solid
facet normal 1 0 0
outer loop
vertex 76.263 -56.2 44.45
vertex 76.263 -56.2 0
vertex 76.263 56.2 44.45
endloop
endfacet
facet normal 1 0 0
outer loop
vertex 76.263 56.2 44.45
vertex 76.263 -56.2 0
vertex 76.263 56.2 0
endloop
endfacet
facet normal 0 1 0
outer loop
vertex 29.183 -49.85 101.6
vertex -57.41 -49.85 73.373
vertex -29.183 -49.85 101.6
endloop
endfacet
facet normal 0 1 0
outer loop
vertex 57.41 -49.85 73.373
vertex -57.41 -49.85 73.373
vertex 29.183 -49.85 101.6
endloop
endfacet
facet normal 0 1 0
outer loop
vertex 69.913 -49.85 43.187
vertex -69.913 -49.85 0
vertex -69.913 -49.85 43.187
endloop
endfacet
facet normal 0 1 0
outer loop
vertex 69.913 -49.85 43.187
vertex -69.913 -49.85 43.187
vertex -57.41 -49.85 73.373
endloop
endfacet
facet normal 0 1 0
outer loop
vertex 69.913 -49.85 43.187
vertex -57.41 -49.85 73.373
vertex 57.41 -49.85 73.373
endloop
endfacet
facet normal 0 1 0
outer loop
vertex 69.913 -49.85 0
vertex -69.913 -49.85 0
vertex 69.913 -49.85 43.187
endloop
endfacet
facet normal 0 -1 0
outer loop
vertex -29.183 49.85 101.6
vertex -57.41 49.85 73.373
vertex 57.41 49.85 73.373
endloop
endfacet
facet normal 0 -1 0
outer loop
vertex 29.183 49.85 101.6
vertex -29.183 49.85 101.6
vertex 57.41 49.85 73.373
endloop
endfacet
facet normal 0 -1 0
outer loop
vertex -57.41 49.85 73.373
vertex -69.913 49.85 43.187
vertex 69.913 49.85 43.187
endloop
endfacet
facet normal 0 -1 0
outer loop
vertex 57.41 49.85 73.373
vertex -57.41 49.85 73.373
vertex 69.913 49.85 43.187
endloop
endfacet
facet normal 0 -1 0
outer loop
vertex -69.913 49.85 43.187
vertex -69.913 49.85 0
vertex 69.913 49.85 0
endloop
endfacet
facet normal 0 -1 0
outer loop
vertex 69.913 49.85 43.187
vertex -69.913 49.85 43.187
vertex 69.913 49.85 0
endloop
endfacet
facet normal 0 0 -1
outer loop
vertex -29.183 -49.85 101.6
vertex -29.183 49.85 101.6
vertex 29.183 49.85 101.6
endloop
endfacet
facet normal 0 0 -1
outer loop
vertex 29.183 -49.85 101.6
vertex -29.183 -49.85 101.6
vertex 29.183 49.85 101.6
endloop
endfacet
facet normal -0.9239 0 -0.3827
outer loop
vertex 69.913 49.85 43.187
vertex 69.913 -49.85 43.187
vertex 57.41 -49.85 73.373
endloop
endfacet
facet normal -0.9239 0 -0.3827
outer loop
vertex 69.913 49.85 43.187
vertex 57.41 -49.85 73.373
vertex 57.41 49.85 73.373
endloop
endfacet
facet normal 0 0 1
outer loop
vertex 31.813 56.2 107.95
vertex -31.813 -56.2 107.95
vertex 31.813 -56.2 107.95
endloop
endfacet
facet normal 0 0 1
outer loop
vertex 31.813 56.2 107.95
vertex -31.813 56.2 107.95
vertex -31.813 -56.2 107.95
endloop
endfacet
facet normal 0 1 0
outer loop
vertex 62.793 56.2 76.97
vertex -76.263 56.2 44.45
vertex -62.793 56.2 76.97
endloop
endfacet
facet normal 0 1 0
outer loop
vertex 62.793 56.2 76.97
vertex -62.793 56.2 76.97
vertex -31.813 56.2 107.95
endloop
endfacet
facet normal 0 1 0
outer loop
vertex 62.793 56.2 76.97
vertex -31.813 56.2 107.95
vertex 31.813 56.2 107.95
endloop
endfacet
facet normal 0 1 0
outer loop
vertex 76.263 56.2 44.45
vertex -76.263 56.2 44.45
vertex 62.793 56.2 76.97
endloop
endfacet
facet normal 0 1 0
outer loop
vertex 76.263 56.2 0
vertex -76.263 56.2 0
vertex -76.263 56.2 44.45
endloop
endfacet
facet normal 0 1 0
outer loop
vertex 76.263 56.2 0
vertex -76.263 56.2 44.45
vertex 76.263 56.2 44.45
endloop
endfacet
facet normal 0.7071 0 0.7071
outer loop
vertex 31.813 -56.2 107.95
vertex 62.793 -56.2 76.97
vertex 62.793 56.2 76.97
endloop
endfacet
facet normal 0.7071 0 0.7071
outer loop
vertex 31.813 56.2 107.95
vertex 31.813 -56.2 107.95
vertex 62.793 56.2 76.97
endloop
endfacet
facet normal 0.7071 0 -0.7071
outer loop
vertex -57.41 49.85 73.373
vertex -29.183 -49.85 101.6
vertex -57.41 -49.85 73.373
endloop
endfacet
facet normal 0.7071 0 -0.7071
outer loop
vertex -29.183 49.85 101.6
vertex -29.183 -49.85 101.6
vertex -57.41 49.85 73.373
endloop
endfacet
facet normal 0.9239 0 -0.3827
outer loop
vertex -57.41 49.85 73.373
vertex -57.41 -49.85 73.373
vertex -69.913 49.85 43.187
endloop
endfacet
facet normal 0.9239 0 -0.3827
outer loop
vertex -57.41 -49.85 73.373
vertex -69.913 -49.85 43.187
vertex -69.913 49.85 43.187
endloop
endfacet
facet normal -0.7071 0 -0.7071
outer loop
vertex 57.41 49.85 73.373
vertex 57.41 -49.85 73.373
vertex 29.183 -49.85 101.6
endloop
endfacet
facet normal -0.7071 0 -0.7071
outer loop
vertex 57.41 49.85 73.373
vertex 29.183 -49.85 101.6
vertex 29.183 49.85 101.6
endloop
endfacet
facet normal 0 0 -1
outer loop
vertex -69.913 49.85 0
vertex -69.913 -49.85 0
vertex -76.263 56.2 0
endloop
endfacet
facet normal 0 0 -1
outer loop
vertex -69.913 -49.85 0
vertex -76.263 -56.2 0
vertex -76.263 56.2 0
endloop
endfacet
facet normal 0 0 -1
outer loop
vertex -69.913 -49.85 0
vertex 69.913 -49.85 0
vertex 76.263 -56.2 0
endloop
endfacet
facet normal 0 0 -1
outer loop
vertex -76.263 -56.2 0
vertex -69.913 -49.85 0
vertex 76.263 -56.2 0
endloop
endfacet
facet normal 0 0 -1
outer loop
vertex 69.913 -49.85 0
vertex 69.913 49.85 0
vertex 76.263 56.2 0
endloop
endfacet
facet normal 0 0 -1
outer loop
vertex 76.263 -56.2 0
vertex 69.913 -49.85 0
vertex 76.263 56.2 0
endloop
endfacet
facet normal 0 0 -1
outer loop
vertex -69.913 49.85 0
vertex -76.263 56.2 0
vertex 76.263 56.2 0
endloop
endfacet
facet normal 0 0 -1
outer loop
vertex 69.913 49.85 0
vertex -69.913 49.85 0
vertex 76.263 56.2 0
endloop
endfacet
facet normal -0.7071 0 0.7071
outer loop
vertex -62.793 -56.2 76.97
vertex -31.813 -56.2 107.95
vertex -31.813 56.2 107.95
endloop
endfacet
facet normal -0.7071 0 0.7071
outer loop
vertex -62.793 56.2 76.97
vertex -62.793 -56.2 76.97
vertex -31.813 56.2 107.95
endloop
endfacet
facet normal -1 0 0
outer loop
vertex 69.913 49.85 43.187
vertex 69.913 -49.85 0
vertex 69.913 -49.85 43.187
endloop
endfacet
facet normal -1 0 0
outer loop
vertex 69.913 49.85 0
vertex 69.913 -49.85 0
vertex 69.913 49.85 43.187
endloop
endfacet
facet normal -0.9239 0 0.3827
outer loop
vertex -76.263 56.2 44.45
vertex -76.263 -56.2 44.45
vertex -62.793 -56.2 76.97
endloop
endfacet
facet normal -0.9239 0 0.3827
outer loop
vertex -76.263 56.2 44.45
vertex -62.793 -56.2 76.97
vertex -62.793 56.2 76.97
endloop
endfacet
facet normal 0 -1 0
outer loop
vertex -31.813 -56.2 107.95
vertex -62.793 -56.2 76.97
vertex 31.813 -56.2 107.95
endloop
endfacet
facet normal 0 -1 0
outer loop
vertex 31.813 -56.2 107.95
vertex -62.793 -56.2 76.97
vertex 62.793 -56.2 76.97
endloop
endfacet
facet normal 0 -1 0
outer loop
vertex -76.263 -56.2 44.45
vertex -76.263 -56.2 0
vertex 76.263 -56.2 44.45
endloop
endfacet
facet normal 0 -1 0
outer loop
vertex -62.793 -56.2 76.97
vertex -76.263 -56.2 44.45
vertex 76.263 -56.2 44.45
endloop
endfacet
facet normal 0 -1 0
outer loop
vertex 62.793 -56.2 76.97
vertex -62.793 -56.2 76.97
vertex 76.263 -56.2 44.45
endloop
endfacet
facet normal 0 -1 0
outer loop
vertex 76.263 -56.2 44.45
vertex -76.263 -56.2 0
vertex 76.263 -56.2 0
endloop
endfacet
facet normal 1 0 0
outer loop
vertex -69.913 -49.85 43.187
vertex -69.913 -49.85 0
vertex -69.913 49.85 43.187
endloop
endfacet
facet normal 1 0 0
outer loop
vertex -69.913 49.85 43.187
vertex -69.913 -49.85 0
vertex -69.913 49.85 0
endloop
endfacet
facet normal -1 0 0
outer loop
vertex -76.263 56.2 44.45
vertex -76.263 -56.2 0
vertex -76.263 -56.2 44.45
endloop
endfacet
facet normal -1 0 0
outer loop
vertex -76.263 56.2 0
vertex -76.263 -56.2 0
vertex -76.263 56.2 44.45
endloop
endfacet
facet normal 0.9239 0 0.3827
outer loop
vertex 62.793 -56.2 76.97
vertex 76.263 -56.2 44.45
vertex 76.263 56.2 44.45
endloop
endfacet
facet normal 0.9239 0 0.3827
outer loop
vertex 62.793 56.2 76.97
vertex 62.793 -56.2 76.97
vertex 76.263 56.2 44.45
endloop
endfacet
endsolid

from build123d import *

# Parameters (mm, degrees)
F0_W     = 152.5266170502
F0_H     = 112.4007552862
F1_DEPTH = 107.95
F2_SIZE  = 44.45
F3_SIZE  = 44.45
F4_SIZE  = 19.05
F5_SIZE  = 19.05
F6_T     = -6.35


with BuildPart() as f1:
    # F0 (on Top) → F1 (new body)
    with BuildSketch(Plane.XY):
        Rectangle(F0_W, F0_H)
    extrude(amount=F1_DEPTH)

    # F2
    f2_edges = [f1.edges().sort_by_distance(p)[0] for p in [
        (-76.263309, 0, 107.95),
    ]]
    chamfer(f2_edges, length=F2_SIZE)

    # F3
    f3_edges = [f1.edges().sort_by_distance(p)[0] for p in [
        (76.263309, 0, 107.95),
    ]]
    chamfer(f3_edges, length=F3_SIZE)

    # F4
    f4_edges = [f1.edges().sort_by_distance(p)[0] for p in [
        (-76.263309, 0, 63.5),
    ]]
    chamfer(f4_edges, length=F4_SIZE)

    # F5
    f5_edges = [f1.edges().sort_by_distance(p)[0] for p in [
        (76.263309, 0, 63.5),
    ]]
    chamfer(f5_edges, length=F5_SIZE)

    # F6
    f6_openings = [f1.faces().sort_by_distance(p)[0] for p in [
        (0, 0, 0),
    ]]
    offset(amount=F6_T, openings=f6_openings)


solid = f1.part
